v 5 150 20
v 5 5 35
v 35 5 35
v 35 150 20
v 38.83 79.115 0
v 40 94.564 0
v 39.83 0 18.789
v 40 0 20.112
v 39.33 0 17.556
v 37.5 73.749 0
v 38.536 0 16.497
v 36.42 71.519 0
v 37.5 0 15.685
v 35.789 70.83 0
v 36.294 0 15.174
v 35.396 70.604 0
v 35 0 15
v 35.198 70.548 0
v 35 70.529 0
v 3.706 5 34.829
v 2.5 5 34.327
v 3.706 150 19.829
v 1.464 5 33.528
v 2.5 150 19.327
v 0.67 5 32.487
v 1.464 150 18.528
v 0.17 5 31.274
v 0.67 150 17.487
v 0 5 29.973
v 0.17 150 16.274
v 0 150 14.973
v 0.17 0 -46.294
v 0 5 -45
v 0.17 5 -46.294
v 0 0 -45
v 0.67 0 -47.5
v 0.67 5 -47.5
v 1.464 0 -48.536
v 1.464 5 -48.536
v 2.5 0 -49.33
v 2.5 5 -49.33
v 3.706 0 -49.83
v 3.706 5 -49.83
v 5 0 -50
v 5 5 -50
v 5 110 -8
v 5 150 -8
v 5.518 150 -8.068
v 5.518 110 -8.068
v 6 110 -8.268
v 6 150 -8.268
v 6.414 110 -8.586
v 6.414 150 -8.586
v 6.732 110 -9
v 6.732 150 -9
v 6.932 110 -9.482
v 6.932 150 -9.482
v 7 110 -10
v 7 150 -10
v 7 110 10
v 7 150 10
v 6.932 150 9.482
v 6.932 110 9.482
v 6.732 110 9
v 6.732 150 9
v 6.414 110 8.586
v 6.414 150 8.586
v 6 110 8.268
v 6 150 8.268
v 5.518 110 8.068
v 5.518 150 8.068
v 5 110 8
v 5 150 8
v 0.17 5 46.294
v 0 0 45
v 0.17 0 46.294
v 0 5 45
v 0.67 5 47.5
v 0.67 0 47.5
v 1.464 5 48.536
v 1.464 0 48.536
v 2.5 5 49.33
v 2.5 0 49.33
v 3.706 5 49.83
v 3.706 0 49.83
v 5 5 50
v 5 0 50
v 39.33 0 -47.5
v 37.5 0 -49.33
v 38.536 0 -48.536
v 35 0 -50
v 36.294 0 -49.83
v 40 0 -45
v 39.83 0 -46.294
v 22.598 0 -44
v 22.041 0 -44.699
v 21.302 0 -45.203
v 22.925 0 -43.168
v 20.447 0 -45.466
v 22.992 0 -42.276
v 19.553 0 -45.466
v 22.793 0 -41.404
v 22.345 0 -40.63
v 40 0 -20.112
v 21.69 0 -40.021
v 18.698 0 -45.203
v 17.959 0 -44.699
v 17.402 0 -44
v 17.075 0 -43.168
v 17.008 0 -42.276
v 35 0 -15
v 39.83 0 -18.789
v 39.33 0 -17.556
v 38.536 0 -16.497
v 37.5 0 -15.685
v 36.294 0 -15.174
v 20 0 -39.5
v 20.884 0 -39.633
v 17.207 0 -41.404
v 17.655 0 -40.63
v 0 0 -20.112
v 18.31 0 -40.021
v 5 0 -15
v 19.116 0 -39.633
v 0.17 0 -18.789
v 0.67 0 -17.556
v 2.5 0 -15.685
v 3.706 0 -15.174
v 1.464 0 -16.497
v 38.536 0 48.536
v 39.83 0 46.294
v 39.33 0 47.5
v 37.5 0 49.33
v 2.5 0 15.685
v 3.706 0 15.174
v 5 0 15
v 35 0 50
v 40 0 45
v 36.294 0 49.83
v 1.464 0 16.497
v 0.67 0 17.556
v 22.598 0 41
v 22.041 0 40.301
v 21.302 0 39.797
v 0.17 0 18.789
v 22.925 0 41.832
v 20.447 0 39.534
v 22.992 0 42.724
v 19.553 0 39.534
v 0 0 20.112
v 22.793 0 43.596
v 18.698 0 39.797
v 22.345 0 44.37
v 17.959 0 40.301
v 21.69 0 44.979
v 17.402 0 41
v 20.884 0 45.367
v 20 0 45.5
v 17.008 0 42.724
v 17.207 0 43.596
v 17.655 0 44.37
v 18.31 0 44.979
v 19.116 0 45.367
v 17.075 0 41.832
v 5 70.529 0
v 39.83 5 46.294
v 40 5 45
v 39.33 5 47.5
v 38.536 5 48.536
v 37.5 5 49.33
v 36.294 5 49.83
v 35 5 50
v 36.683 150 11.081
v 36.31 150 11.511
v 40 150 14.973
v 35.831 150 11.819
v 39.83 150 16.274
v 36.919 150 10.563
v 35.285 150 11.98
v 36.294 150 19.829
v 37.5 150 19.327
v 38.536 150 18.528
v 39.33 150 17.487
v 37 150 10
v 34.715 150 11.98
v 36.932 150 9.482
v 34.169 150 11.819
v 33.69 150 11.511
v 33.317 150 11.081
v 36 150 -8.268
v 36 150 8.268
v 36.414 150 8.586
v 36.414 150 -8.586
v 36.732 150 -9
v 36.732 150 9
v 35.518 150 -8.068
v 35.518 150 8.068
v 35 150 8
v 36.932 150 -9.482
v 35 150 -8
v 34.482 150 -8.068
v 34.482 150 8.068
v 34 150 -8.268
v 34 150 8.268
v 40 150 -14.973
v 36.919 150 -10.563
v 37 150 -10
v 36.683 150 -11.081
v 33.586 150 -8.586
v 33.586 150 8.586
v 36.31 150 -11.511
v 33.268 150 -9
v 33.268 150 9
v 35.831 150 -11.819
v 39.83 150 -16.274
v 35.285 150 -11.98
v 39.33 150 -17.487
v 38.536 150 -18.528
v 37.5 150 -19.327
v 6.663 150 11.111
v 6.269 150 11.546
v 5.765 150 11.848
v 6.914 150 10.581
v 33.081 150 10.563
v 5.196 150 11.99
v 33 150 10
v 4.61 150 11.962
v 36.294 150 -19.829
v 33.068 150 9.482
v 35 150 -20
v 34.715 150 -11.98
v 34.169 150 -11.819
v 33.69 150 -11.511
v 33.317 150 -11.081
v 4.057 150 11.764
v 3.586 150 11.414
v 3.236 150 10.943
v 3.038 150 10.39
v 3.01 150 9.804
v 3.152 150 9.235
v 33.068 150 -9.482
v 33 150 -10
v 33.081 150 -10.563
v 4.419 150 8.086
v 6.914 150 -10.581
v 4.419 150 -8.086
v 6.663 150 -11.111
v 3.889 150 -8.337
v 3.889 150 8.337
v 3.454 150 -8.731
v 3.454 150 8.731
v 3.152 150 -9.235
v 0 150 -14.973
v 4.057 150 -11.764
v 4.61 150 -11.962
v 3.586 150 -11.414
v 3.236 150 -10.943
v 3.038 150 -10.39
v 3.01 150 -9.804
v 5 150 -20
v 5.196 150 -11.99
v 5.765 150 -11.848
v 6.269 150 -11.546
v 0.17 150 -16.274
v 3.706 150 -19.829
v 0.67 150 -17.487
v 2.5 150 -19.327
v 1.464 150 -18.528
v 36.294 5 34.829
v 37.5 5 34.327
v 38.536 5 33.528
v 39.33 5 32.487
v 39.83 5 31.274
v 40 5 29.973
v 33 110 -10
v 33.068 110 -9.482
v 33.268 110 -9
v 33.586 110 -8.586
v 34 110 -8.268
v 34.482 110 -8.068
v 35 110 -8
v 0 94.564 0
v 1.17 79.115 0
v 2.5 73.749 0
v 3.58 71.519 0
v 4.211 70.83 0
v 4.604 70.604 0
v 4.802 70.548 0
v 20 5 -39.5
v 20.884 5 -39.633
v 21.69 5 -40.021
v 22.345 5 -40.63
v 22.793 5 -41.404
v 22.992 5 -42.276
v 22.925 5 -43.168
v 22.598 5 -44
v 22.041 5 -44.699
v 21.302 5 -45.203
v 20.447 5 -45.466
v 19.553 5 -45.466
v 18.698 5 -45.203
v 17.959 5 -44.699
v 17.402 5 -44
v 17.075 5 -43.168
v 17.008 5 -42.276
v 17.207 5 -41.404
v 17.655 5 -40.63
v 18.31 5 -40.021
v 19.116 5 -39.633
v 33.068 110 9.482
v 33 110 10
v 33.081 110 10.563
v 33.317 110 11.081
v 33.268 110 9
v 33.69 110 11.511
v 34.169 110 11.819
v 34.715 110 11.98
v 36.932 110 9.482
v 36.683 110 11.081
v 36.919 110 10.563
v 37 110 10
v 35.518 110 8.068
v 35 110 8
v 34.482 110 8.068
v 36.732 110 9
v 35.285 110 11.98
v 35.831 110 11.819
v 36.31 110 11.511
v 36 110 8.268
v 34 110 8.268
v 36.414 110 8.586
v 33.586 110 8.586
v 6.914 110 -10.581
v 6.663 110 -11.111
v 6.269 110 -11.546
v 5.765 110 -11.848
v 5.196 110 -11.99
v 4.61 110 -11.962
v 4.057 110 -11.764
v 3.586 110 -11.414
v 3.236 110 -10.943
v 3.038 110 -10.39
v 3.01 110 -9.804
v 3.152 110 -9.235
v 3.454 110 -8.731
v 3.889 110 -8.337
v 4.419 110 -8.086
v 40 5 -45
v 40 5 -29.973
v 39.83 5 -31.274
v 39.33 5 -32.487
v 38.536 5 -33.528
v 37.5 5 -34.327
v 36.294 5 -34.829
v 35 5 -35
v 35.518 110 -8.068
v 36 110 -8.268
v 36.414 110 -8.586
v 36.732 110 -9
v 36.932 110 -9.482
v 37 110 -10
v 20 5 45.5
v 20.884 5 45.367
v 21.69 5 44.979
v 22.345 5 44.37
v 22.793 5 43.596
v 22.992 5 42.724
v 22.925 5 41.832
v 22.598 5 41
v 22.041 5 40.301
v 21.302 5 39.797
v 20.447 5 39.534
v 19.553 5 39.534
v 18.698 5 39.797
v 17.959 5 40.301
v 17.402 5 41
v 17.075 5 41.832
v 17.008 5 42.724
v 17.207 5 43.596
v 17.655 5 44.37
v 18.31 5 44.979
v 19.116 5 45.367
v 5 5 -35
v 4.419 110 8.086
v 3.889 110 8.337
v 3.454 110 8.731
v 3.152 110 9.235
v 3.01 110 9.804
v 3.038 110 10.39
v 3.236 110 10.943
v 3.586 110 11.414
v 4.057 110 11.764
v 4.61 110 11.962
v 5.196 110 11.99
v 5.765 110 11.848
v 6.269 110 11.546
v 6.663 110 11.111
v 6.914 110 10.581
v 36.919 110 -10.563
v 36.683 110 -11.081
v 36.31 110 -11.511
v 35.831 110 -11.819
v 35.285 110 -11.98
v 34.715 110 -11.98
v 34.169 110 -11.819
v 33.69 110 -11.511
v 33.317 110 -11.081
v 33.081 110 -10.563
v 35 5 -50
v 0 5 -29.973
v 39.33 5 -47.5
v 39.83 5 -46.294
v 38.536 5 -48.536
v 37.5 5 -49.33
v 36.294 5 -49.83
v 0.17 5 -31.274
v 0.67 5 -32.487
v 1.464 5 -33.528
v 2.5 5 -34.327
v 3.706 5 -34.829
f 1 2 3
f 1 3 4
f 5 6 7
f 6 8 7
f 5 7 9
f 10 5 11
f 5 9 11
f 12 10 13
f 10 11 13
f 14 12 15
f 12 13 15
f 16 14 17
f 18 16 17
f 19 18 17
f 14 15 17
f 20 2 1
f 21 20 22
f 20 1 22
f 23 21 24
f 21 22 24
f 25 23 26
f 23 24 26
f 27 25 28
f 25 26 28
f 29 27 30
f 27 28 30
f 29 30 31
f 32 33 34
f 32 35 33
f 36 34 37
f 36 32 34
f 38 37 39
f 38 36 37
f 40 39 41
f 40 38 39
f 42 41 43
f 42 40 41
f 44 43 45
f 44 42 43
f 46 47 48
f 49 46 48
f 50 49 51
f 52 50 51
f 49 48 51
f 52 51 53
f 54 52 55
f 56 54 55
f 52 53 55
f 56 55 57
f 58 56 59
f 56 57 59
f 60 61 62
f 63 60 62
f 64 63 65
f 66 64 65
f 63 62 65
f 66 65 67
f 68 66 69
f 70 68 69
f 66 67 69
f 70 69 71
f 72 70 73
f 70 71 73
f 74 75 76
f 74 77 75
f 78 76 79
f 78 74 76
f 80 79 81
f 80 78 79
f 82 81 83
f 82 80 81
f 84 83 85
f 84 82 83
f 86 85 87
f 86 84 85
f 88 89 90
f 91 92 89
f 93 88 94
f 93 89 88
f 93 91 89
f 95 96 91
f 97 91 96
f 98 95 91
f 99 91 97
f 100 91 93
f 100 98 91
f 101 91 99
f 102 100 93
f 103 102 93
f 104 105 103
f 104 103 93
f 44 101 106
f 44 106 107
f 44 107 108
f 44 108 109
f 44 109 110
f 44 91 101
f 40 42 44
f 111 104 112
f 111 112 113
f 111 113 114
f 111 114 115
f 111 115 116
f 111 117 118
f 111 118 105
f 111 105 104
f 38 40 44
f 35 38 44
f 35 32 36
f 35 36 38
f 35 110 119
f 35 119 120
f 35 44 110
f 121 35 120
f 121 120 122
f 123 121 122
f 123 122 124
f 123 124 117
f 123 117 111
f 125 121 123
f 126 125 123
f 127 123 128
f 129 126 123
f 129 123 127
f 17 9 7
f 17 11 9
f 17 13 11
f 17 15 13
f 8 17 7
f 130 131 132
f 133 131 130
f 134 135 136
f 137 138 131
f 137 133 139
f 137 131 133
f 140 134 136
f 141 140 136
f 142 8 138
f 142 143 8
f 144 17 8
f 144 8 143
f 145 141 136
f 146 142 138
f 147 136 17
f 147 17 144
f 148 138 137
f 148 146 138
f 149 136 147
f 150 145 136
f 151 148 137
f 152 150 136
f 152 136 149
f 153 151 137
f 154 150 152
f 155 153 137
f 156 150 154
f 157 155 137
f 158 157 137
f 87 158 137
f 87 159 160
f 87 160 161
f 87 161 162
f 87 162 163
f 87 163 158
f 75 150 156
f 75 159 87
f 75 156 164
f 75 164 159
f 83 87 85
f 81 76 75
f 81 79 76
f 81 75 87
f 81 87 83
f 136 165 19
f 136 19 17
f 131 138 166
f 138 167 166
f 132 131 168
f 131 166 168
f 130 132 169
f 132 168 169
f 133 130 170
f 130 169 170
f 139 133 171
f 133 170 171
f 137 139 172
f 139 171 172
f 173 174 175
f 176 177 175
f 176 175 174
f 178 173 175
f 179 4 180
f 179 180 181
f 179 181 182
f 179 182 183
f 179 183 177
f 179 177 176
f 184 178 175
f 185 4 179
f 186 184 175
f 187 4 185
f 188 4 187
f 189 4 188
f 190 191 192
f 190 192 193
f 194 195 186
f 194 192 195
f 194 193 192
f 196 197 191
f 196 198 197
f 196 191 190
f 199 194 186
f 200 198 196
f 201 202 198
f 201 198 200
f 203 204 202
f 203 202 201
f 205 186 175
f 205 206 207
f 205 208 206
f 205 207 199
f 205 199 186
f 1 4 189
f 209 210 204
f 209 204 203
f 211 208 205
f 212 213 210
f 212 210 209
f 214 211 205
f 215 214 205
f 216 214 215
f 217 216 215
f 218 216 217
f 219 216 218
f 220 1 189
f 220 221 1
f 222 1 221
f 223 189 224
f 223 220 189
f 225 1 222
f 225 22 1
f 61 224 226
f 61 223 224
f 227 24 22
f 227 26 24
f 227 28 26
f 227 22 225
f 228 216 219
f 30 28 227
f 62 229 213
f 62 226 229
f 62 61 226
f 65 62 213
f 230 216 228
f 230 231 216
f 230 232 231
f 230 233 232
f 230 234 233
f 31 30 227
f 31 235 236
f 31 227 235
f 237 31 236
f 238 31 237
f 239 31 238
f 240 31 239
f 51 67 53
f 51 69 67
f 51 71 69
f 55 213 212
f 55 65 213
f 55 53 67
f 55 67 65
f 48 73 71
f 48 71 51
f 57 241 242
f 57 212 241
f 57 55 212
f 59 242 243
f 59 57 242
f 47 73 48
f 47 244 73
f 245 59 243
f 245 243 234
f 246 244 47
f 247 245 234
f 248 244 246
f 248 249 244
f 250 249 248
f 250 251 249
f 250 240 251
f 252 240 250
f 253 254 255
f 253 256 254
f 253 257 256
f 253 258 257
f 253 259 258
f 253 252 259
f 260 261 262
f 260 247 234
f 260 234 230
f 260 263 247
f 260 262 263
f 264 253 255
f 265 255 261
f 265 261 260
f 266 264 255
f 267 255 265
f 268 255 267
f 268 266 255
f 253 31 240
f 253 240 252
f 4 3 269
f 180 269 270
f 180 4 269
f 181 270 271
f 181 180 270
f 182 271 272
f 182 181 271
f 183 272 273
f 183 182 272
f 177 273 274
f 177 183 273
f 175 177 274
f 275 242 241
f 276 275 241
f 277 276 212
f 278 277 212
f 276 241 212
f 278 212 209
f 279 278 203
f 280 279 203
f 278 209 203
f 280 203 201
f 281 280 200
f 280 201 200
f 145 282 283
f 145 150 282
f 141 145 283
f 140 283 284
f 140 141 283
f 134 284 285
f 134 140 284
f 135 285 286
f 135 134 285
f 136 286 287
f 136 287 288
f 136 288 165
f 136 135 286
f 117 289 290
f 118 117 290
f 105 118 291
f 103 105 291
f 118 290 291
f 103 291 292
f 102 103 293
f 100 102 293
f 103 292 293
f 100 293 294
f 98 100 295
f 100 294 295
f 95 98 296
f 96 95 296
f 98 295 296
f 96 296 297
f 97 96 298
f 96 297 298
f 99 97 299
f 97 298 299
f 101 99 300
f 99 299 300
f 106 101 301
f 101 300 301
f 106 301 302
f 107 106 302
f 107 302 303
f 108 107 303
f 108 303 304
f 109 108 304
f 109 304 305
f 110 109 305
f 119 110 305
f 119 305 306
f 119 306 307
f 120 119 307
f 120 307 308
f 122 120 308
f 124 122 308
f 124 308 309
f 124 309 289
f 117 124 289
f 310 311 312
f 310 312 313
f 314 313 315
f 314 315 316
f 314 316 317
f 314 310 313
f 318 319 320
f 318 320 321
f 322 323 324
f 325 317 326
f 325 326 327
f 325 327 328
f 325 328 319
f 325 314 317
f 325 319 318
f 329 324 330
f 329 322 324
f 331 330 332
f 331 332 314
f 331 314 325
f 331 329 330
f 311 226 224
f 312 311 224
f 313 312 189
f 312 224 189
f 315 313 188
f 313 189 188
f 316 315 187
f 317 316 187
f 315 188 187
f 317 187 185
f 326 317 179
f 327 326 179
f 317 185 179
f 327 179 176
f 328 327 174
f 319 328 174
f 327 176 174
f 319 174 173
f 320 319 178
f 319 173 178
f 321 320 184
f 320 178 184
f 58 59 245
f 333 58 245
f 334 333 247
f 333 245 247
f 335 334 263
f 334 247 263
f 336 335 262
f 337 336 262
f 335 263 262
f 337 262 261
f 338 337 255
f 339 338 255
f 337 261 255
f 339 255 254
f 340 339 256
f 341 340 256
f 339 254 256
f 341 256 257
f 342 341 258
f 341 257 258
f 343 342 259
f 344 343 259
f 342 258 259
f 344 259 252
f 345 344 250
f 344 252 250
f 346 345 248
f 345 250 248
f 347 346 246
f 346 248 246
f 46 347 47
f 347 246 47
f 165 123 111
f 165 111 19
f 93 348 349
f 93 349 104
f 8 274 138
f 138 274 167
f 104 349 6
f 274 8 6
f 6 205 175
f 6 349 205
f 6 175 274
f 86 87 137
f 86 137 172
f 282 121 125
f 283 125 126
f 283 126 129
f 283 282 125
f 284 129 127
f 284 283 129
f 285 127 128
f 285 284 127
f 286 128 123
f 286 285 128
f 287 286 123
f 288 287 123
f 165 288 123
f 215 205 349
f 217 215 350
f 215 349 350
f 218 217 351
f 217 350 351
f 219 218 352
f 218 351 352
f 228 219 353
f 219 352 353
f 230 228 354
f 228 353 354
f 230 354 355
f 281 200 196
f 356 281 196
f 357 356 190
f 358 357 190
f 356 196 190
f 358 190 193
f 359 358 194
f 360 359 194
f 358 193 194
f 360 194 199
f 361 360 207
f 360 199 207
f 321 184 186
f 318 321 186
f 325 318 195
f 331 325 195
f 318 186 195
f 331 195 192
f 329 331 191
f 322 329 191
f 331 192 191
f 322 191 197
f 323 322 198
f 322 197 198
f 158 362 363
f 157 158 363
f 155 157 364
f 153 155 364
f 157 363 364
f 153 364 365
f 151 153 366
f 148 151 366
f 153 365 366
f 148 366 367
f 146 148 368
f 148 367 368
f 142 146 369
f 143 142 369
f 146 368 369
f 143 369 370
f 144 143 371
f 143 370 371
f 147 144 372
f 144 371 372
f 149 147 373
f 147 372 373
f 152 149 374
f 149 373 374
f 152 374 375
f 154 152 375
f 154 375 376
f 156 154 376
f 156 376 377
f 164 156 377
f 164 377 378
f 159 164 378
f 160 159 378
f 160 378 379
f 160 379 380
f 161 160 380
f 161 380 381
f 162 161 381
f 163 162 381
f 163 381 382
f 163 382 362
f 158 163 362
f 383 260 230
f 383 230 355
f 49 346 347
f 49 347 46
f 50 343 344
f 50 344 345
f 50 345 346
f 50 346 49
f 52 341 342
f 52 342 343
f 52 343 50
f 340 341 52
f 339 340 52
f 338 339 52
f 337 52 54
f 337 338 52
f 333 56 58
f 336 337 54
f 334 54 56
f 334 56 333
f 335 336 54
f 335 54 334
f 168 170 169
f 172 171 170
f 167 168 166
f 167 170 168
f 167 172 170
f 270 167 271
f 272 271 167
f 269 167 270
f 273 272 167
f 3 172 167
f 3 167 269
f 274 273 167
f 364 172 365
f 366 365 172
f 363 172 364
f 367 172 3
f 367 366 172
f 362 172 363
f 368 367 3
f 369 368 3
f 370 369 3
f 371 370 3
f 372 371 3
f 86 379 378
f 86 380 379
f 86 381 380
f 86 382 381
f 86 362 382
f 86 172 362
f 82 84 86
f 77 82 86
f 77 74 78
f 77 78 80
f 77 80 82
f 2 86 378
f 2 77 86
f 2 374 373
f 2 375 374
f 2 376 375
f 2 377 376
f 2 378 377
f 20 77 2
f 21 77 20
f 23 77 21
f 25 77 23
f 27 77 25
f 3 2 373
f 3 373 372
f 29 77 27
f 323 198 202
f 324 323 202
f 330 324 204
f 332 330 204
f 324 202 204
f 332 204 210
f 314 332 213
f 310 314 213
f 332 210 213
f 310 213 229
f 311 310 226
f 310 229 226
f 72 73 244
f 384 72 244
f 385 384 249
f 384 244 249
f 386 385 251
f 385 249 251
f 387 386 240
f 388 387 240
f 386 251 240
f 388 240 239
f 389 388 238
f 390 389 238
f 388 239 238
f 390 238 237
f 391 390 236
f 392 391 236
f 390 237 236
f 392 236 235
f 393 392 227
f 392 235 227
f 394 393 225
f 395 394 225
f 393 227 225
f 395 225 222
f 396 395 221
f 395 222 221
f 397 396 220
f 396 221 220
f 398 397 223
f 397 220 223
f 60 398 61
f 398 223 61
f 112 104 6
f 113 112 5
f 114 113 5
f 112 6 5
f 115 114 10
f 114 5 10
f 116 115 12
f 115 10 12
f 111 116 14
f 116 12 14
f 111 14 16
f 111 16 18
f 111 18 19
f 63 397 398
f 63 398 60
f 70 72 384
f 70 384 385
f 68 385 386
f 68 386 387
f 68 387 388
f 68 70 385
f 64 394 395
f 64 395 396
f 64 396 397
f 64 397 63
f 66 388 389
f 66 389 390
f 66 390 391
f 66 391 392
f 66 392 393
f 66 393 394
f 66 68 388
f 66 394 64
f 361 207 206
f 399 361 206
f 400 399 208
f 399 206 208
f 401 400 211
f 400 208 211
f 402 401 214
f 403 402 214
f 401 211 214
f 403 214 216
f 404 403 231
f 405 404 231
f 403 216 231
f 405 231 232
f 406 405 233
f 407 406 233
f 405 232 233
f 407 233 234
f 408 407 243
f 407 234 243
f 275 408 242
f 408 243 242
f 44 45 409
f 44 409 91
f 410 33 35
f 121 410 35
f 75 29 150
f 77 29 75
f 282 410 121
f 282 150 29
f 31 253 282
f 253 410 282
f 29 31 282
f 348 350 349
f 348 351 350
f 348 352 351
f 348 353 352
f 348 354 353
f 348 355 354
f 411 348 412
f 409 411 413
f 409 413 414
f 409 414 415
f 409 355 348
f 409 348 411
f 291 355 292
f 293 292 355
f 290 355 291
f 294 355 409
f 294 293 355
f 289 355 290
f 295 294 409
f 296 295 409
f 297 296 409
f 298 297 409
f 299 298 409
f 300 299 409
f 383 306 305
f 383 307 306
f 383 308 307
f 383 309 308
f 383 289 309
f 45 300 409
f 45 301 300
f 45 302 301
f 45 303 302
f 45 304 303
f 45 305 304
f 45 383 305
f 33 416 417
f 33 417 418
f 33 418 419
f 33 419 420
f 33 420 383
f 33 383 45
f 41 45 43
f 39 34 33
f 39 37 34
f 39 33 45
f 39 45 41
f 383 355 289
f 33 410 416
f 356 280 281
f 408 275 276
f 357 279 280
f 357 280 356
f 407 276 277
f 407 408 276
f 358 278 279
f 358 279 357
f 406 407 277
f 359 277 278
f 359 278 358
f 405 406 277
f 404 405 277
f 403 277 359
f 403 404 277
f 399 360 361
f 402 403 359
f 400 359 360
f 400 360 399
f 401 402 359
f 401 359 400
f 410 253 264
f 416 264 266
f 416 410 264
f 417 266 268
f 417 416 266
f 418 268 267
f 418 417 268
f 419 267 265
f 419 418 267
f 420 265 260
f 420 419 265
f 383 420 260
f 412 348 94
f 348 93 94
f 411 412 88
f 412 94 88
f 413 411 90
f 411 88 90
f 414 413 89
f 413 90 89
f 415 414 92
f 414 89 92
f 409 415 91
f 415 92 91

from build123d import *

# Parameters (mm, degrees)
BOSS_EXTRUDE1_DEPTH = 40
SKETCH2_R           = 3
CUT_EXTRUDE1_DEPTH  = 40
CUT_EXTRUDE2_DEPTH  = 40
FILLET1_R           = 5


with BuildPart() as part:
    # Sketch1 → Boss-Extrude1 (new body)
    with BuildSketch(Plane(origin=(0, 0, 0), x_dir=(0, 0, -1), z_dir=(1, 0, 0))):
        Polygon((-20, 150), (20, 150), (35, 5), (50, 5), (50, 0), (15, 0), (0, 70.528805369), (-15, 0), (-50, 0), (-50, 5), (-35, 5), align=None)
    extrude(amount=BOSS_EXTRUDE1_DEPTH)

    # Sketch2 → Cut-Extrude1 (cut)
    with BuildSketch(Plane(origin=(0, 5, 0), x_dir=(1, 0, 0), z_dir=(0, 1, 0))):
        with Locations(Location((20, 42.5, 0), (0, 0, 270))):
            Circle(SKETCH2_R)
        with Locations(Location((20, -42.5, 0), (0, 0, 270))):
            Circle(SKETCH2_R)
    extrude(amount=-CUT_EXTRUDE1_DEPTH, mode=Mode.SUBTRACT)

    # Sketch3 → Cut-Extrude2 (cut)
    with BuildSketch(Plane(origin=(0, 150, 0), x_dir=(1, 0, 0), z_dir=(0, 1, 0))):
        with BuildLine():
            ThreePointArc((35, -8), (33.585786438, -8.585786438), (33, -10))
            Line((33, -10), (35, -10))
            Line((35, -10), (35, -8))
        make_face()
        with BuildLine():
            Line((35, -10), (33, -10))
            ThreePointArc((33, -10), (35, -12), (37, -10))
            ThreePointArc((37, -10), (36.414213562, -8.585786438), (35, -8))
            Line((35, -8), (35, -10))
        make_face()
        with BuildLine():
            ThreePointArc((33, 10), (33.585786438, 8.585786438), (35, 8))
            Line((35, 8), (35, 10))
            Line((35, 10), (33, 10))
        make_face()
        with BuildLine():
            Line((35, 10), (35, 8))
            ThreePointArc((35, 8), (36.414213562, 8.585786438), (37, 10))
            ThreePointArc((37, 10), (35, 12), (33, 10))
            Line((33, 10), (35, 10))
        make_face()
        with BuildLine():
            ThreePointArc((7, 10), (3.585786438, 11.414213562), (5, 8))
            Line((5, 8), (5, 10))
            Line((5, 10), (7, 10))
        make_face()
        with BuildLine():
            Line((5, 10), (5, 8))
            ThreePointArc((5, 8), (6.414213562, 8.585786438), (7, 10))
            Line((7, 10), (5, 10))
        make_face()
        with BuildLine():
            Line((5, -8), (5, -10))
            Line((5, -10), (7, -10))
            ThreePointArc((7, -10), (6.414213562, -8.585786438), (5, -8))
        make_face()
        with BuildLine():
            Line((7, -10), (5, -10))
            Line((5, -10), (5, -8))
            ThreePointArc((5, -8), (3.585786438, -11.414213562), (7, -10))
        make_face()
    extrude(amount=-CUT_EXTRUDE2_DEPTH, mode=Mode.SUBTRACT)

    # Fillet1
    fillet1_edges = [part.edges().sort_by_distance(p)[0] for p in [
        (0, 2.5, -50),
        (0, 35.264402685, -7.5),
        (0, 35.264402685, 7.5),
        (40, 77.5, 27.5),
        (0, 2.5, 50),
        (0, 77.5, 27.5),
        (0, 77.5, -27.5),
        (40, 2.5, 50),
        (40, 35.264402685, 7.5),
        (40, 35.264402685, -7.5),
        (40, 2.5, -50),
        (40, 77.5, -27.5),
    ]]
    fillet(fillet1_edges, radius=FILLET1_R)


solid = part.part
